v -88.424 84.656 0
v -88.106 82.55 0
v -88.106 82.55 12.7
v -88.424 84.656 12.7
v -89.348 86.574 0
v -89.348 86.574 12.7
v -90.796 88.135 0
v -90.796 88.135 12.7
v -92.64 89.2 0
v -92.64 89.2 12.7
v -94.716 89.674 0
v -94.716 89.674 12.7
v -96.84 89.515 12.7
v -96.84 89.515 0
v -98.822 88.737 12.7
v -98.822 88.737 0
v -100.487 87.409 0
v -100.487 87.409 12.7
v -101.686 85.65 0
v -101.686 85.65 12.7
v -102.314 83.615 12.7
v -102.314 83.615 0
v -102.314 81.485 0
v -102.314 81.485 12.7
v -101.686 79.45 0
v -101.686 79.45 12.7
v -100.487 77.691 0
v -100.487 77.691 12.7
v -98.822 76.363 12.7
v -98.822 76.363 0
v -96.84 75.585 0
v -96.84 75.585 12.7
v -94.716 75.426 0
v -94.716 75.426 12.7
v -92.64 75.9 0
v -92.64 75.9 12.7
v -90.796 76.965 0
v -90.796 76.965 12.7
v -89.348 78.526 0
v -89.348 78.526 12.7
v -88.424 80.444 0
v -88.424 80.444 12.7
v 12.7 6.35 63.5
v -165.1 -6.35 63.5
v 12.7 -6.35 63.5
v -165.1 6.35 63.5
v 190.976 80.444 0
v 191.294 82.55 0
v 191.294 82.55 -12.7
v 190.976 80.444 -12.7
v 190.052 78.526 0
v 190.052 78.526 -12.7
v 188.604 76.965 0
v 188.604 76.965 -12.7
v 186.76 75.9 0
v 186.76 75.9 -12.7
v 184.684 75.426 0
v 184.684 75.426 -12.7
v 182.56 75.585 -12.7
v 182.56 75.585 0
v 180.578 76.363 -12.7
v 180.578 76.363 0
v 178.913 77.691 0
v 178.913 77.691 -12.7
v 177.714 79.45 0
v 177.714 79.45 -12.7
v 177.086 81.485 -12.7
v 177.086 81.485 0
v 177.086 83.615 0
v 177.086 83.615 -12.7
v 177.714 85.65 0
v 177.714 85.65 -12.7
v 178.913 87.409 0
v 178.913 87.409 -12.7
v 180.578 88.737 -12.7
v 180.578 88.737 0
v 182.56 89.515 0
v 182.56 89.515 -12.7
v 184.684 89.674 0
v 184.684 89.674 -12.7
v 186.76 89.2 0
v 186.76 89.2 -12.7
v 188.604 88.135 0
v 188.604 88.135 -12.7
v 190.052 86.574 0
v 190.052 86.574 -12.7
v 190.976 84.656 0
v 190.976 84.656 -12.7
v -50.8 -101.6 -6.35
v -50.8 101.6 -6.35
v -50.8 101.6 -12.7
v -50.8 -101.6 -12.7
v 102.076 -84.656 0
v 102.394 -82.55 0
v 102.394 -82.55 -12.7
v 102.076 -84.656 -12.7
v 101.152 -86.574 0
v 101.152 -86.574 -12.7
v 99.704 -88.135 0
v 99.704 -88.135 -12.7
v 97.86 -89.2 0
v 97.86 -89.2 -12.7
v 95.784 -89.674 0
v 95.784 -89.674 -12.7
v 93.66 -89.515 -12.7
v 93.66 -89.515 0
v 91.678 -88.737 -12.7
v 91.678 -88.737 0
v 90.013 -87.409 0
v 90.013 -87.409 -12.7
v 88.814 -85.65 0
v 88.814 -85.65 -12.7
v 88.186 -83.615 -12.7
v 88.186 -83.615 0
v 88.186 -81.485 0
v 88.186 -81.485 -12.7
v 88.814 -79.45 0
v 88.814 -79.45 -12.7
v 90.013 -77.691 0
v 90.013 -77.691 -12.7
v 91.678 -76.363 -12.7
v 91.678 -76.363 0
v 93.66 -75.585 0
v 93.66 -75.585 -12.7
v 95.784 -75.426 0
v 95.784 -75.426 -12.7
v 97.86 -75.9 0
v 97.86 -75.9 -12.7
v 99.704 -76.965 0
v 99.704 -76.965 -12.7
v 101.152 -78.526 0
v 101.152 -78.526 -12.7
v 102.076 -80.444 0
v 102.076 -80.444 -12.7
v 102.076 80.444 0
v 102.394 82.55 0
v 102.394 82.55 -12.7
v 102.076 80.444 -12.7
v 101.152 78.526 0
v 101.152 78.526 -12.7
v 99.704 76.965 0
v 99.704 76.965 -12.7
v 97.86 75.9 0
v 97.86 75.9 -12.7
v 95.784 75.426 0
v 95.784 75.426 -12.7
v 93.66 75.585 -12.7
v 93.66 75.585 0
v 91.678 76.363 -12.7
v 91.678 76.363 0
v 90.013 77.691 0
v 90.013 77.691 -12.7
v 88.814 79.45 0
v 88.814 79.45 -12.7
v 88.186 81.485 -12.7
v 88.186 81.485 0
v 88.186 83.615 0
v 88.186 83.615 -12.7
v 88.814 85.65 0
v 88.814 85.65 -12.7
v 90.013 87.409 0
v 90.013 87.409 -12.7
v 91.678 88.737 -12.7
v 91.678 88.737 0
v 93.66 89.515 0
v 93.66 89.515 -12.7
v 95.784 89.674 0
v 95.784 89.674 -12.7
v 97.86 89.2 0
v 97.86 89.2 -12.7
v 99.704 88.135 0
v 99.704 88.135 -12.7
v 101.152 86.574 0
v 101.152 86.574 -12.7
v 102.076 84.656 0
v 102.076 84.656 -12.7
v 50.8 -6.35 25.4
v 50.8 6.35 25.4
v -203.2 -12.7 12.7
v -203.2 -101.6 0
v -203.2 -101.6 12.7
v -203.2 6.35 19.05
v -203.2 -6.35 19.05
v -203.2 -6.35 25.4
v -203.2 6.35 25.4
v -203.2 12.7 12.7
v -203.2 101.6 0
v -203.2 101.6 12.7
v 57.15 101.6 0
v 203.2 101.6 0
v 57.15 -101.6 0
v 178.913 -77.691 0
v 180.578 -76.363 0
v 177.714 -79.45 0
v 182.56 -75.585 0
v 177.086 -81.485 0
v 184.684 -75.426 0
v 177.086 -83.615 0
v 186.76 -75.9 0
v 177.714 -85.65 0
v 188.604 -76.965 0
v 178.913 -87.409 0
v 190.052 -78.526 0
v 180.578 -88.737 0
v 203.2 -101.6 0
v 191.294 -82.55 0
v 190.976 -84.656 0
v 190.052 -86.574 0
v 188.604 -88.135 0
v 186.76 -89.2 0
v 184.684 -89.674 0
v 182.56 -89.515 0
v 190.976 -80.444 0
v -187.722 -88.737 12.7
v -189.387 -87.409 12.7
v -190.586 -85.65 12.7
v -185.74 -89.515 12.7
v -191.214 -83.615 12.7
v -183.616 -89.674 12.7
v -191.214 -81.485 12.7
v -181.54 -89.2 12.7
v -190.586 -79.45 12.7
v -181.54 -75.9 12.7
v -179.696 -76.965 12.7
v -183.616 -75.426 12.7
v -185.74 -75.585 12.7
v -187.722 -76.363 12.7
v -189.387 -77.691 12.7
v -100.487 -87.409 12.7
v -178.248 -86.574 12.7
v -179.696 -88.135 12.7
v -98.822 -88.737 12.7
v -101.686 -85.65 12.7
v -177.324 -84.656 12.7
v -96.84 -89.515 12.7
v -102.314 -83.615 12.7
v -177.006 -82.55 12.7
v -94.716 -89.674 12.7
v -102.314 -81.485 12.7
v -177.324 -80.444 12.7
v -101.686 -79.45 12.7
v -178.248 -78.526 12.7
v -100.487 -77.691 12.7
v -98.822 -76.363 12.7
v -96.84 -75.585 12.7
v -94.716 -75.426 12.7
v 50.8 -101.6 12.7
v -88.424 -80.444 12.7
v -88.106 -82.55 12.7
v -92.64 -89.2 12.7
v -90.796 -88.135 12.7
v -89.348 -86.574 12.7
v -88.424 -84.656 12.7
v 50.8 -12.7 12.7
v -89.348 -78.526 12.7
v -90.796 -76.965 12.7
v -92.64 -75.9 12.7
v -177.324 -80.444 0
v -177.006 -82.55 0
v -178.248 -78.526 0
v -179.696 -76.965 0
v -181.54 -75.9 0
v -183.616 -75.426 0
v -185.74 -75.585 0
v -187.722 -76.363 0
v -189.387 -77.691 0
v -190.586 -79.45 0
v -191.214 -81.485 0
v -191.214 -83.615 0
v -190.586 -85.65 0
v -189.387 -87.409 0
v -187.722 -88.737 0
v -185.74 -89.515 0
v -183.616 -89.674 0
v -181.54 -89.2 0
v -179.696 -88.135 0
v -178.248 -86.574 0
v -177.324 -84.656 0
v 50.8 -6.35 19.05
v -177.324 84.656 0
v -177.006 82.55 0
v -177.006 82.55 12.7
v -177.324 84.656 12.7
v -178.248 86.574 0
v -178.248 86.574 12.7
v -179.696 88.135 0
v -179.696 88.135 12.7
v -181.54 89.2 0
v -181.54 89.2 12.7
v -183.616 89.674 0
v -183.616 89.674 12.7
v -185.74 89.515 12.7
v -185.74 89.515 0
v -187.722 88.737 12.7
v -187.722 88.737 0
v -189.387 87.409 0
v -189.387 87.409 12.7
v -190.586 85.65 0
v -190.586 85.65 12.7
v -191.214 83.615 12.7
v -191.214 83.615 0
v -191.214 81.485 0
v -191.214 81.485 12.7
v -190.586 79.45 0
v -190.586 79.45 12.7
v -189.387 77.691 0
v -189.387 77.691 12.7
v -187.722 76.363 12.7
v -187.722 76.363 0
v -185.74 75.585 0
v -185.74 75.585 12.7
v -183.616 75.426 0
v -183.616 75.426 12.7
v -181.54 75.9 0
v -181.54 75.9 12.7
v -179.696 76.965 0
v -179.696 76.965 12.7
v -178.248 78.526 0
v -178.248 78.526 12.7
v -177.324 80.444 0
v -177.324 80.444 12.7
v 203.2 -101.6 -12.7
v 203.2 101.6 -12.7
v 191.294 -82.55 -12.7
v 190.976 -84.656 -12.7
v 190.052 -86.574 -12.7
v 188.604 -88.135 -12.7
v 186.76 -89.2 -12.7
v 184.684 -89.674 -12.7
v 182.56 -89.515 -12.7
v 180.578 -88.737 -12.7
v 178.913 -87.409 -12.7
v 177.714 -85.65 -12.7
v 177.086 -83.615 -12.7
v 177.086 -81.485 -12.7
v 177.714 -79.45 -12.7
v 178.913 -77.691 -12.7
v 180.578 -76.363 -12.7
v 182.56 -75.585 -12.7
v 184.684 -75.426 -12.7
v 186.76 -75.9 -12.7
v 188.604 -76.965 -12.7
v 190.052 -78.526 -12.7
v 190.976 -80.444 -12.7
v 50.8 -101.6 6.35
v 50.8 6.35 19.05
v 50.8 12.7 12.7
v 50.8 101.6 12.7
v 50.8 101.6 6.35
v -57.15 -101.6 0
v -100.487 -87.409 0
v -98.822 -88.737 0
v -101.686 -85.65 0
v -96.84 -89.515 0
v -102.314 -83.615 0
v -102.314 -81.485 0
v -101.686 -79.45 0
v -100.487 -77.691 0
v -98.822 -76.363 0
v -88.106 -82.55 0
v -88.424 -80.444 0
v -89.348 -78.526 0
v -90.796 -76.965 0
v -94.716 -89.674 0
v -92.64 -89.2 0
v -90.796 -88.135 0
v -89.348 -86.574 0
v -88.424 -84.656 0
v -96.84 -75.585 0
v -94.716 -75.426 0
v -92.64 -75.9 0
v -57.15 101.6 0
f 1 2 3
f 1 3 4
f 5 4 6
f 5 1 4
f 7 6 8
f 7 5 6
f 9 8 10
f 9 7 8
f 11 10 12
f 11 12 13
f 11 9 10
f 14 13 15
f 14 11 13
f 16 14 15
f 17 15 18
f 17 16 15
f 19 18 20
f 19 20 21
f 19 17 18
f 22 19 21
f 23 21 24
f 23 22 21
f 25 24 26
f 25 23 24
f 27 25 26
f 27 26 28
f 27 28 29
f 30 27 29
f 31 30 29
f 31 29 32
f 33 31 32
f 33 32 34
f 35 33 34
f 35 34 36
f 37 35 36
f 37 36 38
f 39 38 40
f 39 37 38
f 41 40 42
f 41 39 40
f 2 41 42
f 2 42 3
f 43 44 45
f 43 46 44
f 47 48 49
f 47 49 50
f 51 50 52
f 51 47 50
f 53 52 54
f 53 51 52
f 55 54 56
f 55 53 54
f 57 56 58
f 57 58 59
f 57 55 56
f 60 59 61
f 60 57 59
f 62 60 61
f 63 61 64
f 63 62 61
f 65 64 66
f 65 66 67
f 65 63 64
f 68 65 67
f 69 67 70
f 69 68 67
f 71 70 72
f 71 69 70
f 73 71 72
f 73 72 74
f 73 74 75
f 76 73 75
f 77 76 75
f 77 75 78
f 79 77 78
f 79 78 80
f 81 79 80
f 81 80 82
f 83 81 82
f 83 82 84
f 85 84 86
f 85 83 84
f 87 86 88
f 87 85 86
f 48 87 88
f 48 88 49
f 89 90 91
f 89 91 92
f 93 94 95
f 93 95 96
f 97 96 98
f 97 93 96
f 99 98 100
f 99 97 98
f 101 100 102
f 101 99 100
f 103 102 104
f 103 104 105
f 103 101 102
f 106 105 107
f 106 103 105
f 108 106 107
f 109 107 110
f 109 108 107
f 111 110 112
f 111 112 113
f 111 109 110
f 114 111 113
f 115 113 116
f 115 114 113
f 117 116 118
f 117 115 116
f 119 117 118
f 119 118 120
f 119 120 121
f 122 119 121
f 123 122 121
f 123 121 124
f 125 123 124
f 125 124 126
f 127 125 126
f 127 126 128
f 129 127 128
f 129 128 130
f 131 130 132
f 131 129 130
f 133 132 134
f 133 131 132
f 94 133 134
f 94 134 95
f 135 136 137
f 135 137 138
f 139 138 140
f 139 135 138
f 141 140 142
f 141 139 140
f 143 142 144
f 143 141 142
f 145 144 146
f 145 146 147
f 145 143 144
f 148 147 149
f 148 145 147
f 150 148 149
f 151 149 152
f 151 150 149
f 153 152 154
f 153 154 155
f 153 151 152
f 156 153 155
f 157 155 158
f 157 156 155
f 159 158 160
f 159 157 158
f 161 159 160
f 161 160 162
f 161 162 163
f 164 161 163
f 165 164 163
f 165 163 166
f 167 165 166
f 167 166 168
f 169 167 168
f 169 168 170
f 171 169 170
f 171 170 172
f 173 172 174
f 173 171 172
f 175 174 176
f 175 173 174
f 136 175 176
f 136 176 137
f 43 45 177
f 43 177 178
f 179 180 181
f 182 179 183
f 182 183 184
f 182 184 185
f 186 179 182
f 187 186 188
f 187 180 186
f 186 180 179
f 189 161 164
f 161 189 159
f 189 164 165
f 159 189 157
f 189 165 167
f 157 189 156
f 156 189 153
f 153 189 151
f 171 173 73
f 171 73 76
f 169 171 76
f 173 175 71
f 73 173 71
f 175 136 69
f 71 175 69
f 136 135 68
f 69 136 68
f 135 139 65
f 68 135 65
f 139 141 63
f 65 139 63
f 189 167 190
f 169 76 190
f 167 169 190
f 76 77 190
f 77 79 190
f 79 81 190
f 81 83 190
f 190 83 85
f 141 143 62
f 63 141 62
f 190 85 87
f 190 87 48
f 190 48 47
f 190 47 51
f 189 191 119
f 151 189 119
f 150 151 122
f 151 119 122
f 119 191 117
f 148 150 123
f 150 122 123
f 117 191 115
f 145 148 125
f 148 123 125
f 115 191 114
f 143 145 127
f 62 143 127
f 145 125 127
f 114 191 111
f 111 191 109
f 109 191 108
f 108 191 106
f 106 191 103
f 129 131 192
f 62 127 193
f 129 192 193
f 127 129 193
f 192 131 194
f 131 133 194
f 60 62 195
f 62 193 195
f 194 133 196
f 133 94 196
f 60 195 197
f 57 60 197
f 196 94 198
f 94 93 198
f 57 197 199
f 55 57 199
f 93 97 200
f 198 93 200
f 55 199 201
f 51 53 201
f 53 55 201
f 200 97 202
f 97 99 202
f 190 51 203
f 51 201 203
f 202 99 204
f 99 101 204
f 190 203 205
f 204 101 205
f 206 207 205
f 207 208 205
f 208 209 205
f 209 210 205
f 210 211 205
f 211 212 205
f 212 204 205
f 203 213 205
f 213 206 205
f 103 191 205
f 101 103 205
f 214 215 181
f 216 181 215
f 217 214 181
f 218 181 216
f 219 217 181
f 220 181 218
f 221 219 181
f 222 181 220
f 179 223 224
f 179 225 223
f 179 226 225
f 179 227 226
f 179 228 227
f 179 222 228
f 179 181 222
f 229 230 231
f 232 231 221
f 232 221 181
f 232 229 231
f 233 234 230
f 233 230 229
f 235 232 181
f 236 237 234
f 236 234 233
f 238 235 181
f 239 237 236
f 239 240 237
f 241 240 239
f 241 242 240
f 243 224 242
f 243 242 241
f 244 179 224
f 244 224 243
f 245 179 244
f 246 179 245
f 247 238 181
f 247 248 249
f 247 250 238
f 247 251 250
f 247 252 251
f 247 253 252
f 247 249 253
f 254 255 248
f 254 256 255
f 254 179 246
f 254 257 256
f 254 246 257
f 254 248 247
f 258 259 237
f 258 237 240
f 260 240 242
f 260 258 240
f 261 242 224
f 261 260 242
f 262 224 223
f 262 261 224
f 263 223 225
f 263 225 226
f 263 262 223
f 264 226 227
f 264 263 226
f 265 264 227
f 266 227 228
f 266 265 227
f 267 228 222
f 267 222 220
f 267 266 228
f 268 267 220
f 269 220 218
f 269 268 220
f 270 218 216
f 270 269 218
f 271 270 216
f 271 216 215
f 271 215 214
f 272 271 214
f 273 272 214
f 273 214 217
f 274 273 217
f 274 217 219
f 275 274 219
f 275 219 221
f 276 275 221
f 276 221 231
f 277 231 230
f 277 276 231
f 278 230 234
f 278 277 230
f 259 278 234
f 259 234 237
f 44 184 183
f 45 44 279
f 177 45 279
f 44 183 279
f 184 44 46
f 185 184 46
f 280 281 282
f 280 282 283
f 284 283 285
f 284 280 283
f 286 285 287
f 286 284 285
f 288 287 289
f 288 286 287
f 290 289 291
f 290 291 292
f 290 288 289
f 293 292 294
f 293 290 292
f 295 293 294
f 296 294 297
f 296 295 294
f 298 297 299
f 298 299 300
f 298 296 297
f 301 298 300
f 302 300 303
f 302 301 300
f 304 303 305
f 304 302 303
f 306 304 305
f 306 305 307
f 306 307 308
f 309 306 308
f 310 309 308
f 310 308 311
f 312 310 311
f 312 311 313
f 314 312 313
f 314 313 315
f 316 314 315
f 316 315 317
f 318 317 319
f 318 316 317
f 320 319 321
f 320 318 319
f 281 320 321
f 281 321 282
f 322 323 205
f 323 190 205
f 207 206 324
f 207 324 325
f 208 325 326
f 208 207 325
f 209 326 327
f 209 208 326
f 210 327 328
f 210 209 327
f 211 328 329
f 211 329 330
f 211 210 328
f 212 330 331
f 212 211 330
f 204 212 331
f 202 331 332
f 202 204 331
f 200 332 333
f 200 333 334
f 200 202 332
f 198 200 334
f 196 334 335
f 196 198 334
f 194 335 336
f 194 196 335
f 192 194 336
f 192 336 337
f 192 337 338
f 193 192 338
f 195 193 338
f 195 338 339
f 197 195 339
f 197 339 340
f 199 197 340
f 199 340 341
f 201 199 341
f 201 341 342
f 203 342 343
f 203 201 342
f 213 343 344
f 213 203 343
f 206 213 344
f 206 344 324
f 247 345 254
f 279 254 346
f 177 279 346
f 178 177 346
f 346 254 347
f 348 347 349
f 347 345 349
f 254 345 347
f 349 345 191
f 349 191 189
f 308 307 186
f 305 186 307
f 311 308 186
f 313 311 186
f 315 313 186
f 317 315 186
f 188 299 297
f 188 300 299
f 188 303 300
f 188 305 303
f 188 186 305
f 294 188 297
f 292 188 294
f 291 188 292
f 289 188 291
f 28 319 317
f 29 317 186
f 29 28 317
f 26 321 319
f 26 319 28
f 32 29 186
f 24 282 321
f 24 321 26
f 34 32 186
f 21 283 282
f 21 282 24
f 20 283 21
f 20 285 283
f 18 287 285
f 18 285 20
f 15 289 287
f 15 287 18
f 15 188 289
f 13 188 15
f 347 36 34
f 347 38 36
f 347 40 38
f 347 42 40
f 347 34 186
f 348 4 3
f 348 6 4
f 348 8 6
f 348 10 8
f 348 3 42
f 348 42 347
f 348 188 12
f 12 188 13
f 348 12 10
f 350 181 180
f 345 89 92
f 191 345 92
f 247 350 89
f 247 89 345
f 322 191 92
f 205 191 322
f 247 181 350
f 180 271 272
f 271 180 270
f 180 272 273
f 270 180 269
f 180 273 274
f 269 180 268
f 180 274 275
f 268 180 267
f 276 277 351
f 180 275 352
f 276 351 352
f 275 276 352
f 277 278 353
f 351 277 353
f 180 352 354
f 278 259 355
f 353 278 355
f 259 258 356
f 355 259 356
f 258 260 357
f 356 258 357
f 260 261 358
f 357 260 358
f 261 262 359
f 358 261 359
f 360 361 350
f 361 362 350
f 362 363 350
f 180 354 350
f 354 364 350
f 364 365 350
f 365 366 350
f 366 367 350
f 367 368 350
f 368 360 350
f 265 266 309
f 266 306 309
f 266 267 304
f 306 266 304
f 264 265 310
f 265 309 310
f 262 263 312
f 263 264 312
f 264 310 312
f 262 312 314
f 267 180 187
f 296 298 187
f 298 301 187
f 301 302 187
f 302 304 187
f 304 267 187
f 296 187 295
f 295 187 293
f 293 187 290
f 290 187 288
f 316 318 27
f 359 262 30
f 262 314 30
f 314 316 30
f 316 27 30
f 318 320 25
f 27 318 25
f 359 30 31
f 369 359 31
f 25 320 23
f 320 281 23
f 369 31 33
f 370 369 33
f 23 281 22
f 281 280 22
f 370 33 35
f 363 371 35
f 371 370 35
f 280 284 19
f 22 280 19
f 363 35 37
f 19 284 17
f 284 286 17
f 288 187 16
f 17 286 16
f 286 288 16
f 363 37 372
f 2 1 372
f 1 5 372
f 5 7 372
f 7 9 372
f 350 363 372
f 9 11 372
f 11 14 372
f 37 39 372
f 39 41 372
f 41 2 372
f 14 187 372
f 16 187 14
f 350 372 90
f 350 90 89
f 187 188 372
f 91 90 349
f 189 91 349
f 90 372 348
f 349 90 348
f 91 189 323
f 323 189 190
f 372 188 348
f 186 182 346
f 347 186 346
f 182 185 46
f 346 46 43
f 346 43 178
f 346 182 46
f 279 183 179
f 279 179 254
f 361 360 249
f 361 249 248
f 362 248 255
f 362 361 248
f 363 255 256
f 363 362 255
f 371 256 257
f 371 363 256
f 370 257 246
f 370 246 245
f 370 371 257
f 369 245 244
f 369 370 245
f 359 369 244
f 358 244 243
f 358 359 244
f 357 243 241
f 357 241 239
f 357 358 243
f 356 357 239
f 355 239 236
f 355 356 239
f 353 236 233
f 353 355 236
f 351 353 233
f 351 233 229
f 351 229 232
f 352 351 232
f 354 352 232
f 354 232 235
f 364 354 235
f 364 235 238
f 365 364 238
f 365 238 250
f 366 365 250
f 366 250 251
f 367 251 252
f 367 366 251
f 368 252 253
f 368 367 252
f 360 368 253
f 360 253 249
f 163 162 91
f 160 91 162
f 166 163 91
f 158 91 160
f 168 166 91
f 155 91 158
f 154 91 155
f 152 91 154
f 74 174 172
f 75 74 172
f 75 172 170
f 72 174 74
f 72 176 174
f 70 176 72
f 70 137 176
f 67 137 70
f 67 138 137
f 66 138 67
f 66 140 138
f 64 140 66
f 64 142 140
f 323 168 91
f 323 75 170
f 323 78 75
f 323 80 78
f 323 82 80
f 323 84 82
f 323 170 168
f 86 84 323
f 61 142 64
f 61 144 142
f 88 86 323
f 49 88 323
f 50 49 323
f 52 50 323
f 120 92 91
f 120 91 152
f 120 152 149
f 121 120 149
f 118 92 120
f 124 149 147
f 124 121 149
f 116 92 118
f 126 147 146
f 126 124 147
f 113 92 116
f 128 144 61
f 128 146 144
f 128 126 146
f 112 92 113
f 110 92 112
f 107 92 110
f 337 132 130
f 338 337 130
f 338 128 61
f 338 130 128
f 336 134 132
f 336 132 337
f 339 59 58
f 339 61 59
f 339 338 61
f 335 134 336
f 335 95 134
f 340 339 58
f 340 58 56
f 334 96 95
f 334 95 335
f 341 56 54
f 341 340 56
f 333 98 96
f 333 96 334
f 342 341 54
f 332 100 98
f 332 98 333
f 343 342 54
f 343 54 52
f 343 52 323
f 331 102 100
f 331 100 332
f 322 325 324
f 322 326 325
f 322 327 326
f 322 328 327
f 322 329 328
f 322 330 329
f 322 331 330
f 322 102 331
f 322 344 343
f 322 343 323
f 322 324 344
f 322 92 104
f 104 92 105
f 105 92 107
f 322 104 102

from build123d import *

# Parameters (mm, degrees)
F0_W      = 254
F0_H      = 203.2
F0_R      = 7.14375
F1_DEPTH  = 12.7
F2_W      = 254
F2_H      = 203.2
F2_R      = 7.14375
F3_DEPTH  = 12.7
F4_W      = 254
F4_H      = 12.7
F5_DEPTH  = 50.8
F6_SIZE   = 38.1
F7_W      = 254
F7_H      = 12.7
F8_DEPTH  = 50.8
F9_SIZE   = 38.1
F11_SIZE  = 6.35
F12_W     = 290.5442907095
F12_H     = 101.1743683696
F13_DEPTH = 203.201


with BuildPart() as f1:
    # F0 (on Top) → F1 (new body)
    with BuildSketch(Plane.XY):
        with Locations((-76.2, 0)):
            Rectangle(F0_W, F0_H)
        with Locations((-184.15, -82.55)):
            Circle(F0_R, mode=Mode.SUBTRACT)
        with Locations((-95.25, -82.55)):
            Circle(F0_R, mode=Mode.SUBTRACT)
        with Locations((-184.15, 82.55)):
            Circle(F0_R, mode=Mode.SUBTRACT)
        with Locations((-95.25, 82.55)):
            Circle(F0_R, mode=Mode.SUBTRACT)
    extrude(amount=F1_DEPTH)


with BuildPart() as f3:
    # F2 (on face) → F3 (new body)
    with BuildSketch(Plane(origin=(0, 0, 0), x_dir=(1, 0, 0), z_dir=(0, 0, -1))):
        with Locations((76.2, 0)):
            Rectangle(F2_W, F2_H)
        with Locations((95.25, -82.55)):
            Circle(F2_R, mode=Mode.SUBTRACT)
        with Locations((184.15, -82.55)):
            Circle(F2_R, mode=Mode.SUBTRACT)
        with Locations((95.25, 82.55)):
            Circle(F2_R, mode=Mode.SUBTRACT)
        with Locations((184.15, 82.55)):
            Circle(F2_R, mode=Mode.SUBTRACT)
    extrude(amount=F3_DEPTH)


with BuildPart() as f5:
    # F4 (on face) → F5 (new body)
    with BuildSketch(Plane.XY.offset(12.7)):
        with Locations((-76.2, 0)):
            Rectangle(F4_W, F4_H)
    extrude(amount=F5_DEPTH)

    # F6
    f6_edges = [f5.edges().sort_by_distance(p)[0] for p in [
        (-203.2, 0, 63.5),
        (50.8, 0, 63.5),
    ]]
    chamfer(f6_edges, length=F6_SIZE)


with BuildPart() as f8:
    # F7 (on face) → F8 (new body)
    with BuildSketch(Plane(origin=(0, 0, -12.7), x_dir=(1, 0, 0), z_dir=(0, 0, -1))):
        with Locations((76.2, 0)):
            Rectangle(F7_W, F7_H)
    extrude(amount=F8_DEPTH)

    # F9
    f9_edges = [f8.edges().sort_by_distance(p)[0] for p in [
        (203.2, 0, -63.5),
        (-50.8, 0, -63.5),
    ]]
    chamfer(f9_edges, length=F9_SIZE)


with BuildPart() as f1_1:
    add(f1.part)

    # F10: union F5, F3, F8
    add(f5.part)
    add(f3.part)
    add(f8.part)

    # F11
    f11_edges = [f1_1.edges().sort_by_distance(p)[0] for p in [
        (50.8, 0, 0),
        (-76.2, -6.35, 12.7),
        (-76.2, 6.35, 12.7),
        (-50.8, 0, 0),
        (76.2, 6.35, -12.7),
        (76.2, -6.35, -12.7),
    ]]
    chamfer(f11_edges, length=F11_SIZE)

    # F12 (on face) → F13 (cut, through all)
    with BuildSketch(Plane.XZ.offset(101.6)):
        with Locations((94.4721453547, -63.2871841848)):
            Rectangle(F12_W, F12_H)
    extrude(amount=-F13_DEPTH, mode=Mode.SUBTRACT)


solid = f1_1.part
